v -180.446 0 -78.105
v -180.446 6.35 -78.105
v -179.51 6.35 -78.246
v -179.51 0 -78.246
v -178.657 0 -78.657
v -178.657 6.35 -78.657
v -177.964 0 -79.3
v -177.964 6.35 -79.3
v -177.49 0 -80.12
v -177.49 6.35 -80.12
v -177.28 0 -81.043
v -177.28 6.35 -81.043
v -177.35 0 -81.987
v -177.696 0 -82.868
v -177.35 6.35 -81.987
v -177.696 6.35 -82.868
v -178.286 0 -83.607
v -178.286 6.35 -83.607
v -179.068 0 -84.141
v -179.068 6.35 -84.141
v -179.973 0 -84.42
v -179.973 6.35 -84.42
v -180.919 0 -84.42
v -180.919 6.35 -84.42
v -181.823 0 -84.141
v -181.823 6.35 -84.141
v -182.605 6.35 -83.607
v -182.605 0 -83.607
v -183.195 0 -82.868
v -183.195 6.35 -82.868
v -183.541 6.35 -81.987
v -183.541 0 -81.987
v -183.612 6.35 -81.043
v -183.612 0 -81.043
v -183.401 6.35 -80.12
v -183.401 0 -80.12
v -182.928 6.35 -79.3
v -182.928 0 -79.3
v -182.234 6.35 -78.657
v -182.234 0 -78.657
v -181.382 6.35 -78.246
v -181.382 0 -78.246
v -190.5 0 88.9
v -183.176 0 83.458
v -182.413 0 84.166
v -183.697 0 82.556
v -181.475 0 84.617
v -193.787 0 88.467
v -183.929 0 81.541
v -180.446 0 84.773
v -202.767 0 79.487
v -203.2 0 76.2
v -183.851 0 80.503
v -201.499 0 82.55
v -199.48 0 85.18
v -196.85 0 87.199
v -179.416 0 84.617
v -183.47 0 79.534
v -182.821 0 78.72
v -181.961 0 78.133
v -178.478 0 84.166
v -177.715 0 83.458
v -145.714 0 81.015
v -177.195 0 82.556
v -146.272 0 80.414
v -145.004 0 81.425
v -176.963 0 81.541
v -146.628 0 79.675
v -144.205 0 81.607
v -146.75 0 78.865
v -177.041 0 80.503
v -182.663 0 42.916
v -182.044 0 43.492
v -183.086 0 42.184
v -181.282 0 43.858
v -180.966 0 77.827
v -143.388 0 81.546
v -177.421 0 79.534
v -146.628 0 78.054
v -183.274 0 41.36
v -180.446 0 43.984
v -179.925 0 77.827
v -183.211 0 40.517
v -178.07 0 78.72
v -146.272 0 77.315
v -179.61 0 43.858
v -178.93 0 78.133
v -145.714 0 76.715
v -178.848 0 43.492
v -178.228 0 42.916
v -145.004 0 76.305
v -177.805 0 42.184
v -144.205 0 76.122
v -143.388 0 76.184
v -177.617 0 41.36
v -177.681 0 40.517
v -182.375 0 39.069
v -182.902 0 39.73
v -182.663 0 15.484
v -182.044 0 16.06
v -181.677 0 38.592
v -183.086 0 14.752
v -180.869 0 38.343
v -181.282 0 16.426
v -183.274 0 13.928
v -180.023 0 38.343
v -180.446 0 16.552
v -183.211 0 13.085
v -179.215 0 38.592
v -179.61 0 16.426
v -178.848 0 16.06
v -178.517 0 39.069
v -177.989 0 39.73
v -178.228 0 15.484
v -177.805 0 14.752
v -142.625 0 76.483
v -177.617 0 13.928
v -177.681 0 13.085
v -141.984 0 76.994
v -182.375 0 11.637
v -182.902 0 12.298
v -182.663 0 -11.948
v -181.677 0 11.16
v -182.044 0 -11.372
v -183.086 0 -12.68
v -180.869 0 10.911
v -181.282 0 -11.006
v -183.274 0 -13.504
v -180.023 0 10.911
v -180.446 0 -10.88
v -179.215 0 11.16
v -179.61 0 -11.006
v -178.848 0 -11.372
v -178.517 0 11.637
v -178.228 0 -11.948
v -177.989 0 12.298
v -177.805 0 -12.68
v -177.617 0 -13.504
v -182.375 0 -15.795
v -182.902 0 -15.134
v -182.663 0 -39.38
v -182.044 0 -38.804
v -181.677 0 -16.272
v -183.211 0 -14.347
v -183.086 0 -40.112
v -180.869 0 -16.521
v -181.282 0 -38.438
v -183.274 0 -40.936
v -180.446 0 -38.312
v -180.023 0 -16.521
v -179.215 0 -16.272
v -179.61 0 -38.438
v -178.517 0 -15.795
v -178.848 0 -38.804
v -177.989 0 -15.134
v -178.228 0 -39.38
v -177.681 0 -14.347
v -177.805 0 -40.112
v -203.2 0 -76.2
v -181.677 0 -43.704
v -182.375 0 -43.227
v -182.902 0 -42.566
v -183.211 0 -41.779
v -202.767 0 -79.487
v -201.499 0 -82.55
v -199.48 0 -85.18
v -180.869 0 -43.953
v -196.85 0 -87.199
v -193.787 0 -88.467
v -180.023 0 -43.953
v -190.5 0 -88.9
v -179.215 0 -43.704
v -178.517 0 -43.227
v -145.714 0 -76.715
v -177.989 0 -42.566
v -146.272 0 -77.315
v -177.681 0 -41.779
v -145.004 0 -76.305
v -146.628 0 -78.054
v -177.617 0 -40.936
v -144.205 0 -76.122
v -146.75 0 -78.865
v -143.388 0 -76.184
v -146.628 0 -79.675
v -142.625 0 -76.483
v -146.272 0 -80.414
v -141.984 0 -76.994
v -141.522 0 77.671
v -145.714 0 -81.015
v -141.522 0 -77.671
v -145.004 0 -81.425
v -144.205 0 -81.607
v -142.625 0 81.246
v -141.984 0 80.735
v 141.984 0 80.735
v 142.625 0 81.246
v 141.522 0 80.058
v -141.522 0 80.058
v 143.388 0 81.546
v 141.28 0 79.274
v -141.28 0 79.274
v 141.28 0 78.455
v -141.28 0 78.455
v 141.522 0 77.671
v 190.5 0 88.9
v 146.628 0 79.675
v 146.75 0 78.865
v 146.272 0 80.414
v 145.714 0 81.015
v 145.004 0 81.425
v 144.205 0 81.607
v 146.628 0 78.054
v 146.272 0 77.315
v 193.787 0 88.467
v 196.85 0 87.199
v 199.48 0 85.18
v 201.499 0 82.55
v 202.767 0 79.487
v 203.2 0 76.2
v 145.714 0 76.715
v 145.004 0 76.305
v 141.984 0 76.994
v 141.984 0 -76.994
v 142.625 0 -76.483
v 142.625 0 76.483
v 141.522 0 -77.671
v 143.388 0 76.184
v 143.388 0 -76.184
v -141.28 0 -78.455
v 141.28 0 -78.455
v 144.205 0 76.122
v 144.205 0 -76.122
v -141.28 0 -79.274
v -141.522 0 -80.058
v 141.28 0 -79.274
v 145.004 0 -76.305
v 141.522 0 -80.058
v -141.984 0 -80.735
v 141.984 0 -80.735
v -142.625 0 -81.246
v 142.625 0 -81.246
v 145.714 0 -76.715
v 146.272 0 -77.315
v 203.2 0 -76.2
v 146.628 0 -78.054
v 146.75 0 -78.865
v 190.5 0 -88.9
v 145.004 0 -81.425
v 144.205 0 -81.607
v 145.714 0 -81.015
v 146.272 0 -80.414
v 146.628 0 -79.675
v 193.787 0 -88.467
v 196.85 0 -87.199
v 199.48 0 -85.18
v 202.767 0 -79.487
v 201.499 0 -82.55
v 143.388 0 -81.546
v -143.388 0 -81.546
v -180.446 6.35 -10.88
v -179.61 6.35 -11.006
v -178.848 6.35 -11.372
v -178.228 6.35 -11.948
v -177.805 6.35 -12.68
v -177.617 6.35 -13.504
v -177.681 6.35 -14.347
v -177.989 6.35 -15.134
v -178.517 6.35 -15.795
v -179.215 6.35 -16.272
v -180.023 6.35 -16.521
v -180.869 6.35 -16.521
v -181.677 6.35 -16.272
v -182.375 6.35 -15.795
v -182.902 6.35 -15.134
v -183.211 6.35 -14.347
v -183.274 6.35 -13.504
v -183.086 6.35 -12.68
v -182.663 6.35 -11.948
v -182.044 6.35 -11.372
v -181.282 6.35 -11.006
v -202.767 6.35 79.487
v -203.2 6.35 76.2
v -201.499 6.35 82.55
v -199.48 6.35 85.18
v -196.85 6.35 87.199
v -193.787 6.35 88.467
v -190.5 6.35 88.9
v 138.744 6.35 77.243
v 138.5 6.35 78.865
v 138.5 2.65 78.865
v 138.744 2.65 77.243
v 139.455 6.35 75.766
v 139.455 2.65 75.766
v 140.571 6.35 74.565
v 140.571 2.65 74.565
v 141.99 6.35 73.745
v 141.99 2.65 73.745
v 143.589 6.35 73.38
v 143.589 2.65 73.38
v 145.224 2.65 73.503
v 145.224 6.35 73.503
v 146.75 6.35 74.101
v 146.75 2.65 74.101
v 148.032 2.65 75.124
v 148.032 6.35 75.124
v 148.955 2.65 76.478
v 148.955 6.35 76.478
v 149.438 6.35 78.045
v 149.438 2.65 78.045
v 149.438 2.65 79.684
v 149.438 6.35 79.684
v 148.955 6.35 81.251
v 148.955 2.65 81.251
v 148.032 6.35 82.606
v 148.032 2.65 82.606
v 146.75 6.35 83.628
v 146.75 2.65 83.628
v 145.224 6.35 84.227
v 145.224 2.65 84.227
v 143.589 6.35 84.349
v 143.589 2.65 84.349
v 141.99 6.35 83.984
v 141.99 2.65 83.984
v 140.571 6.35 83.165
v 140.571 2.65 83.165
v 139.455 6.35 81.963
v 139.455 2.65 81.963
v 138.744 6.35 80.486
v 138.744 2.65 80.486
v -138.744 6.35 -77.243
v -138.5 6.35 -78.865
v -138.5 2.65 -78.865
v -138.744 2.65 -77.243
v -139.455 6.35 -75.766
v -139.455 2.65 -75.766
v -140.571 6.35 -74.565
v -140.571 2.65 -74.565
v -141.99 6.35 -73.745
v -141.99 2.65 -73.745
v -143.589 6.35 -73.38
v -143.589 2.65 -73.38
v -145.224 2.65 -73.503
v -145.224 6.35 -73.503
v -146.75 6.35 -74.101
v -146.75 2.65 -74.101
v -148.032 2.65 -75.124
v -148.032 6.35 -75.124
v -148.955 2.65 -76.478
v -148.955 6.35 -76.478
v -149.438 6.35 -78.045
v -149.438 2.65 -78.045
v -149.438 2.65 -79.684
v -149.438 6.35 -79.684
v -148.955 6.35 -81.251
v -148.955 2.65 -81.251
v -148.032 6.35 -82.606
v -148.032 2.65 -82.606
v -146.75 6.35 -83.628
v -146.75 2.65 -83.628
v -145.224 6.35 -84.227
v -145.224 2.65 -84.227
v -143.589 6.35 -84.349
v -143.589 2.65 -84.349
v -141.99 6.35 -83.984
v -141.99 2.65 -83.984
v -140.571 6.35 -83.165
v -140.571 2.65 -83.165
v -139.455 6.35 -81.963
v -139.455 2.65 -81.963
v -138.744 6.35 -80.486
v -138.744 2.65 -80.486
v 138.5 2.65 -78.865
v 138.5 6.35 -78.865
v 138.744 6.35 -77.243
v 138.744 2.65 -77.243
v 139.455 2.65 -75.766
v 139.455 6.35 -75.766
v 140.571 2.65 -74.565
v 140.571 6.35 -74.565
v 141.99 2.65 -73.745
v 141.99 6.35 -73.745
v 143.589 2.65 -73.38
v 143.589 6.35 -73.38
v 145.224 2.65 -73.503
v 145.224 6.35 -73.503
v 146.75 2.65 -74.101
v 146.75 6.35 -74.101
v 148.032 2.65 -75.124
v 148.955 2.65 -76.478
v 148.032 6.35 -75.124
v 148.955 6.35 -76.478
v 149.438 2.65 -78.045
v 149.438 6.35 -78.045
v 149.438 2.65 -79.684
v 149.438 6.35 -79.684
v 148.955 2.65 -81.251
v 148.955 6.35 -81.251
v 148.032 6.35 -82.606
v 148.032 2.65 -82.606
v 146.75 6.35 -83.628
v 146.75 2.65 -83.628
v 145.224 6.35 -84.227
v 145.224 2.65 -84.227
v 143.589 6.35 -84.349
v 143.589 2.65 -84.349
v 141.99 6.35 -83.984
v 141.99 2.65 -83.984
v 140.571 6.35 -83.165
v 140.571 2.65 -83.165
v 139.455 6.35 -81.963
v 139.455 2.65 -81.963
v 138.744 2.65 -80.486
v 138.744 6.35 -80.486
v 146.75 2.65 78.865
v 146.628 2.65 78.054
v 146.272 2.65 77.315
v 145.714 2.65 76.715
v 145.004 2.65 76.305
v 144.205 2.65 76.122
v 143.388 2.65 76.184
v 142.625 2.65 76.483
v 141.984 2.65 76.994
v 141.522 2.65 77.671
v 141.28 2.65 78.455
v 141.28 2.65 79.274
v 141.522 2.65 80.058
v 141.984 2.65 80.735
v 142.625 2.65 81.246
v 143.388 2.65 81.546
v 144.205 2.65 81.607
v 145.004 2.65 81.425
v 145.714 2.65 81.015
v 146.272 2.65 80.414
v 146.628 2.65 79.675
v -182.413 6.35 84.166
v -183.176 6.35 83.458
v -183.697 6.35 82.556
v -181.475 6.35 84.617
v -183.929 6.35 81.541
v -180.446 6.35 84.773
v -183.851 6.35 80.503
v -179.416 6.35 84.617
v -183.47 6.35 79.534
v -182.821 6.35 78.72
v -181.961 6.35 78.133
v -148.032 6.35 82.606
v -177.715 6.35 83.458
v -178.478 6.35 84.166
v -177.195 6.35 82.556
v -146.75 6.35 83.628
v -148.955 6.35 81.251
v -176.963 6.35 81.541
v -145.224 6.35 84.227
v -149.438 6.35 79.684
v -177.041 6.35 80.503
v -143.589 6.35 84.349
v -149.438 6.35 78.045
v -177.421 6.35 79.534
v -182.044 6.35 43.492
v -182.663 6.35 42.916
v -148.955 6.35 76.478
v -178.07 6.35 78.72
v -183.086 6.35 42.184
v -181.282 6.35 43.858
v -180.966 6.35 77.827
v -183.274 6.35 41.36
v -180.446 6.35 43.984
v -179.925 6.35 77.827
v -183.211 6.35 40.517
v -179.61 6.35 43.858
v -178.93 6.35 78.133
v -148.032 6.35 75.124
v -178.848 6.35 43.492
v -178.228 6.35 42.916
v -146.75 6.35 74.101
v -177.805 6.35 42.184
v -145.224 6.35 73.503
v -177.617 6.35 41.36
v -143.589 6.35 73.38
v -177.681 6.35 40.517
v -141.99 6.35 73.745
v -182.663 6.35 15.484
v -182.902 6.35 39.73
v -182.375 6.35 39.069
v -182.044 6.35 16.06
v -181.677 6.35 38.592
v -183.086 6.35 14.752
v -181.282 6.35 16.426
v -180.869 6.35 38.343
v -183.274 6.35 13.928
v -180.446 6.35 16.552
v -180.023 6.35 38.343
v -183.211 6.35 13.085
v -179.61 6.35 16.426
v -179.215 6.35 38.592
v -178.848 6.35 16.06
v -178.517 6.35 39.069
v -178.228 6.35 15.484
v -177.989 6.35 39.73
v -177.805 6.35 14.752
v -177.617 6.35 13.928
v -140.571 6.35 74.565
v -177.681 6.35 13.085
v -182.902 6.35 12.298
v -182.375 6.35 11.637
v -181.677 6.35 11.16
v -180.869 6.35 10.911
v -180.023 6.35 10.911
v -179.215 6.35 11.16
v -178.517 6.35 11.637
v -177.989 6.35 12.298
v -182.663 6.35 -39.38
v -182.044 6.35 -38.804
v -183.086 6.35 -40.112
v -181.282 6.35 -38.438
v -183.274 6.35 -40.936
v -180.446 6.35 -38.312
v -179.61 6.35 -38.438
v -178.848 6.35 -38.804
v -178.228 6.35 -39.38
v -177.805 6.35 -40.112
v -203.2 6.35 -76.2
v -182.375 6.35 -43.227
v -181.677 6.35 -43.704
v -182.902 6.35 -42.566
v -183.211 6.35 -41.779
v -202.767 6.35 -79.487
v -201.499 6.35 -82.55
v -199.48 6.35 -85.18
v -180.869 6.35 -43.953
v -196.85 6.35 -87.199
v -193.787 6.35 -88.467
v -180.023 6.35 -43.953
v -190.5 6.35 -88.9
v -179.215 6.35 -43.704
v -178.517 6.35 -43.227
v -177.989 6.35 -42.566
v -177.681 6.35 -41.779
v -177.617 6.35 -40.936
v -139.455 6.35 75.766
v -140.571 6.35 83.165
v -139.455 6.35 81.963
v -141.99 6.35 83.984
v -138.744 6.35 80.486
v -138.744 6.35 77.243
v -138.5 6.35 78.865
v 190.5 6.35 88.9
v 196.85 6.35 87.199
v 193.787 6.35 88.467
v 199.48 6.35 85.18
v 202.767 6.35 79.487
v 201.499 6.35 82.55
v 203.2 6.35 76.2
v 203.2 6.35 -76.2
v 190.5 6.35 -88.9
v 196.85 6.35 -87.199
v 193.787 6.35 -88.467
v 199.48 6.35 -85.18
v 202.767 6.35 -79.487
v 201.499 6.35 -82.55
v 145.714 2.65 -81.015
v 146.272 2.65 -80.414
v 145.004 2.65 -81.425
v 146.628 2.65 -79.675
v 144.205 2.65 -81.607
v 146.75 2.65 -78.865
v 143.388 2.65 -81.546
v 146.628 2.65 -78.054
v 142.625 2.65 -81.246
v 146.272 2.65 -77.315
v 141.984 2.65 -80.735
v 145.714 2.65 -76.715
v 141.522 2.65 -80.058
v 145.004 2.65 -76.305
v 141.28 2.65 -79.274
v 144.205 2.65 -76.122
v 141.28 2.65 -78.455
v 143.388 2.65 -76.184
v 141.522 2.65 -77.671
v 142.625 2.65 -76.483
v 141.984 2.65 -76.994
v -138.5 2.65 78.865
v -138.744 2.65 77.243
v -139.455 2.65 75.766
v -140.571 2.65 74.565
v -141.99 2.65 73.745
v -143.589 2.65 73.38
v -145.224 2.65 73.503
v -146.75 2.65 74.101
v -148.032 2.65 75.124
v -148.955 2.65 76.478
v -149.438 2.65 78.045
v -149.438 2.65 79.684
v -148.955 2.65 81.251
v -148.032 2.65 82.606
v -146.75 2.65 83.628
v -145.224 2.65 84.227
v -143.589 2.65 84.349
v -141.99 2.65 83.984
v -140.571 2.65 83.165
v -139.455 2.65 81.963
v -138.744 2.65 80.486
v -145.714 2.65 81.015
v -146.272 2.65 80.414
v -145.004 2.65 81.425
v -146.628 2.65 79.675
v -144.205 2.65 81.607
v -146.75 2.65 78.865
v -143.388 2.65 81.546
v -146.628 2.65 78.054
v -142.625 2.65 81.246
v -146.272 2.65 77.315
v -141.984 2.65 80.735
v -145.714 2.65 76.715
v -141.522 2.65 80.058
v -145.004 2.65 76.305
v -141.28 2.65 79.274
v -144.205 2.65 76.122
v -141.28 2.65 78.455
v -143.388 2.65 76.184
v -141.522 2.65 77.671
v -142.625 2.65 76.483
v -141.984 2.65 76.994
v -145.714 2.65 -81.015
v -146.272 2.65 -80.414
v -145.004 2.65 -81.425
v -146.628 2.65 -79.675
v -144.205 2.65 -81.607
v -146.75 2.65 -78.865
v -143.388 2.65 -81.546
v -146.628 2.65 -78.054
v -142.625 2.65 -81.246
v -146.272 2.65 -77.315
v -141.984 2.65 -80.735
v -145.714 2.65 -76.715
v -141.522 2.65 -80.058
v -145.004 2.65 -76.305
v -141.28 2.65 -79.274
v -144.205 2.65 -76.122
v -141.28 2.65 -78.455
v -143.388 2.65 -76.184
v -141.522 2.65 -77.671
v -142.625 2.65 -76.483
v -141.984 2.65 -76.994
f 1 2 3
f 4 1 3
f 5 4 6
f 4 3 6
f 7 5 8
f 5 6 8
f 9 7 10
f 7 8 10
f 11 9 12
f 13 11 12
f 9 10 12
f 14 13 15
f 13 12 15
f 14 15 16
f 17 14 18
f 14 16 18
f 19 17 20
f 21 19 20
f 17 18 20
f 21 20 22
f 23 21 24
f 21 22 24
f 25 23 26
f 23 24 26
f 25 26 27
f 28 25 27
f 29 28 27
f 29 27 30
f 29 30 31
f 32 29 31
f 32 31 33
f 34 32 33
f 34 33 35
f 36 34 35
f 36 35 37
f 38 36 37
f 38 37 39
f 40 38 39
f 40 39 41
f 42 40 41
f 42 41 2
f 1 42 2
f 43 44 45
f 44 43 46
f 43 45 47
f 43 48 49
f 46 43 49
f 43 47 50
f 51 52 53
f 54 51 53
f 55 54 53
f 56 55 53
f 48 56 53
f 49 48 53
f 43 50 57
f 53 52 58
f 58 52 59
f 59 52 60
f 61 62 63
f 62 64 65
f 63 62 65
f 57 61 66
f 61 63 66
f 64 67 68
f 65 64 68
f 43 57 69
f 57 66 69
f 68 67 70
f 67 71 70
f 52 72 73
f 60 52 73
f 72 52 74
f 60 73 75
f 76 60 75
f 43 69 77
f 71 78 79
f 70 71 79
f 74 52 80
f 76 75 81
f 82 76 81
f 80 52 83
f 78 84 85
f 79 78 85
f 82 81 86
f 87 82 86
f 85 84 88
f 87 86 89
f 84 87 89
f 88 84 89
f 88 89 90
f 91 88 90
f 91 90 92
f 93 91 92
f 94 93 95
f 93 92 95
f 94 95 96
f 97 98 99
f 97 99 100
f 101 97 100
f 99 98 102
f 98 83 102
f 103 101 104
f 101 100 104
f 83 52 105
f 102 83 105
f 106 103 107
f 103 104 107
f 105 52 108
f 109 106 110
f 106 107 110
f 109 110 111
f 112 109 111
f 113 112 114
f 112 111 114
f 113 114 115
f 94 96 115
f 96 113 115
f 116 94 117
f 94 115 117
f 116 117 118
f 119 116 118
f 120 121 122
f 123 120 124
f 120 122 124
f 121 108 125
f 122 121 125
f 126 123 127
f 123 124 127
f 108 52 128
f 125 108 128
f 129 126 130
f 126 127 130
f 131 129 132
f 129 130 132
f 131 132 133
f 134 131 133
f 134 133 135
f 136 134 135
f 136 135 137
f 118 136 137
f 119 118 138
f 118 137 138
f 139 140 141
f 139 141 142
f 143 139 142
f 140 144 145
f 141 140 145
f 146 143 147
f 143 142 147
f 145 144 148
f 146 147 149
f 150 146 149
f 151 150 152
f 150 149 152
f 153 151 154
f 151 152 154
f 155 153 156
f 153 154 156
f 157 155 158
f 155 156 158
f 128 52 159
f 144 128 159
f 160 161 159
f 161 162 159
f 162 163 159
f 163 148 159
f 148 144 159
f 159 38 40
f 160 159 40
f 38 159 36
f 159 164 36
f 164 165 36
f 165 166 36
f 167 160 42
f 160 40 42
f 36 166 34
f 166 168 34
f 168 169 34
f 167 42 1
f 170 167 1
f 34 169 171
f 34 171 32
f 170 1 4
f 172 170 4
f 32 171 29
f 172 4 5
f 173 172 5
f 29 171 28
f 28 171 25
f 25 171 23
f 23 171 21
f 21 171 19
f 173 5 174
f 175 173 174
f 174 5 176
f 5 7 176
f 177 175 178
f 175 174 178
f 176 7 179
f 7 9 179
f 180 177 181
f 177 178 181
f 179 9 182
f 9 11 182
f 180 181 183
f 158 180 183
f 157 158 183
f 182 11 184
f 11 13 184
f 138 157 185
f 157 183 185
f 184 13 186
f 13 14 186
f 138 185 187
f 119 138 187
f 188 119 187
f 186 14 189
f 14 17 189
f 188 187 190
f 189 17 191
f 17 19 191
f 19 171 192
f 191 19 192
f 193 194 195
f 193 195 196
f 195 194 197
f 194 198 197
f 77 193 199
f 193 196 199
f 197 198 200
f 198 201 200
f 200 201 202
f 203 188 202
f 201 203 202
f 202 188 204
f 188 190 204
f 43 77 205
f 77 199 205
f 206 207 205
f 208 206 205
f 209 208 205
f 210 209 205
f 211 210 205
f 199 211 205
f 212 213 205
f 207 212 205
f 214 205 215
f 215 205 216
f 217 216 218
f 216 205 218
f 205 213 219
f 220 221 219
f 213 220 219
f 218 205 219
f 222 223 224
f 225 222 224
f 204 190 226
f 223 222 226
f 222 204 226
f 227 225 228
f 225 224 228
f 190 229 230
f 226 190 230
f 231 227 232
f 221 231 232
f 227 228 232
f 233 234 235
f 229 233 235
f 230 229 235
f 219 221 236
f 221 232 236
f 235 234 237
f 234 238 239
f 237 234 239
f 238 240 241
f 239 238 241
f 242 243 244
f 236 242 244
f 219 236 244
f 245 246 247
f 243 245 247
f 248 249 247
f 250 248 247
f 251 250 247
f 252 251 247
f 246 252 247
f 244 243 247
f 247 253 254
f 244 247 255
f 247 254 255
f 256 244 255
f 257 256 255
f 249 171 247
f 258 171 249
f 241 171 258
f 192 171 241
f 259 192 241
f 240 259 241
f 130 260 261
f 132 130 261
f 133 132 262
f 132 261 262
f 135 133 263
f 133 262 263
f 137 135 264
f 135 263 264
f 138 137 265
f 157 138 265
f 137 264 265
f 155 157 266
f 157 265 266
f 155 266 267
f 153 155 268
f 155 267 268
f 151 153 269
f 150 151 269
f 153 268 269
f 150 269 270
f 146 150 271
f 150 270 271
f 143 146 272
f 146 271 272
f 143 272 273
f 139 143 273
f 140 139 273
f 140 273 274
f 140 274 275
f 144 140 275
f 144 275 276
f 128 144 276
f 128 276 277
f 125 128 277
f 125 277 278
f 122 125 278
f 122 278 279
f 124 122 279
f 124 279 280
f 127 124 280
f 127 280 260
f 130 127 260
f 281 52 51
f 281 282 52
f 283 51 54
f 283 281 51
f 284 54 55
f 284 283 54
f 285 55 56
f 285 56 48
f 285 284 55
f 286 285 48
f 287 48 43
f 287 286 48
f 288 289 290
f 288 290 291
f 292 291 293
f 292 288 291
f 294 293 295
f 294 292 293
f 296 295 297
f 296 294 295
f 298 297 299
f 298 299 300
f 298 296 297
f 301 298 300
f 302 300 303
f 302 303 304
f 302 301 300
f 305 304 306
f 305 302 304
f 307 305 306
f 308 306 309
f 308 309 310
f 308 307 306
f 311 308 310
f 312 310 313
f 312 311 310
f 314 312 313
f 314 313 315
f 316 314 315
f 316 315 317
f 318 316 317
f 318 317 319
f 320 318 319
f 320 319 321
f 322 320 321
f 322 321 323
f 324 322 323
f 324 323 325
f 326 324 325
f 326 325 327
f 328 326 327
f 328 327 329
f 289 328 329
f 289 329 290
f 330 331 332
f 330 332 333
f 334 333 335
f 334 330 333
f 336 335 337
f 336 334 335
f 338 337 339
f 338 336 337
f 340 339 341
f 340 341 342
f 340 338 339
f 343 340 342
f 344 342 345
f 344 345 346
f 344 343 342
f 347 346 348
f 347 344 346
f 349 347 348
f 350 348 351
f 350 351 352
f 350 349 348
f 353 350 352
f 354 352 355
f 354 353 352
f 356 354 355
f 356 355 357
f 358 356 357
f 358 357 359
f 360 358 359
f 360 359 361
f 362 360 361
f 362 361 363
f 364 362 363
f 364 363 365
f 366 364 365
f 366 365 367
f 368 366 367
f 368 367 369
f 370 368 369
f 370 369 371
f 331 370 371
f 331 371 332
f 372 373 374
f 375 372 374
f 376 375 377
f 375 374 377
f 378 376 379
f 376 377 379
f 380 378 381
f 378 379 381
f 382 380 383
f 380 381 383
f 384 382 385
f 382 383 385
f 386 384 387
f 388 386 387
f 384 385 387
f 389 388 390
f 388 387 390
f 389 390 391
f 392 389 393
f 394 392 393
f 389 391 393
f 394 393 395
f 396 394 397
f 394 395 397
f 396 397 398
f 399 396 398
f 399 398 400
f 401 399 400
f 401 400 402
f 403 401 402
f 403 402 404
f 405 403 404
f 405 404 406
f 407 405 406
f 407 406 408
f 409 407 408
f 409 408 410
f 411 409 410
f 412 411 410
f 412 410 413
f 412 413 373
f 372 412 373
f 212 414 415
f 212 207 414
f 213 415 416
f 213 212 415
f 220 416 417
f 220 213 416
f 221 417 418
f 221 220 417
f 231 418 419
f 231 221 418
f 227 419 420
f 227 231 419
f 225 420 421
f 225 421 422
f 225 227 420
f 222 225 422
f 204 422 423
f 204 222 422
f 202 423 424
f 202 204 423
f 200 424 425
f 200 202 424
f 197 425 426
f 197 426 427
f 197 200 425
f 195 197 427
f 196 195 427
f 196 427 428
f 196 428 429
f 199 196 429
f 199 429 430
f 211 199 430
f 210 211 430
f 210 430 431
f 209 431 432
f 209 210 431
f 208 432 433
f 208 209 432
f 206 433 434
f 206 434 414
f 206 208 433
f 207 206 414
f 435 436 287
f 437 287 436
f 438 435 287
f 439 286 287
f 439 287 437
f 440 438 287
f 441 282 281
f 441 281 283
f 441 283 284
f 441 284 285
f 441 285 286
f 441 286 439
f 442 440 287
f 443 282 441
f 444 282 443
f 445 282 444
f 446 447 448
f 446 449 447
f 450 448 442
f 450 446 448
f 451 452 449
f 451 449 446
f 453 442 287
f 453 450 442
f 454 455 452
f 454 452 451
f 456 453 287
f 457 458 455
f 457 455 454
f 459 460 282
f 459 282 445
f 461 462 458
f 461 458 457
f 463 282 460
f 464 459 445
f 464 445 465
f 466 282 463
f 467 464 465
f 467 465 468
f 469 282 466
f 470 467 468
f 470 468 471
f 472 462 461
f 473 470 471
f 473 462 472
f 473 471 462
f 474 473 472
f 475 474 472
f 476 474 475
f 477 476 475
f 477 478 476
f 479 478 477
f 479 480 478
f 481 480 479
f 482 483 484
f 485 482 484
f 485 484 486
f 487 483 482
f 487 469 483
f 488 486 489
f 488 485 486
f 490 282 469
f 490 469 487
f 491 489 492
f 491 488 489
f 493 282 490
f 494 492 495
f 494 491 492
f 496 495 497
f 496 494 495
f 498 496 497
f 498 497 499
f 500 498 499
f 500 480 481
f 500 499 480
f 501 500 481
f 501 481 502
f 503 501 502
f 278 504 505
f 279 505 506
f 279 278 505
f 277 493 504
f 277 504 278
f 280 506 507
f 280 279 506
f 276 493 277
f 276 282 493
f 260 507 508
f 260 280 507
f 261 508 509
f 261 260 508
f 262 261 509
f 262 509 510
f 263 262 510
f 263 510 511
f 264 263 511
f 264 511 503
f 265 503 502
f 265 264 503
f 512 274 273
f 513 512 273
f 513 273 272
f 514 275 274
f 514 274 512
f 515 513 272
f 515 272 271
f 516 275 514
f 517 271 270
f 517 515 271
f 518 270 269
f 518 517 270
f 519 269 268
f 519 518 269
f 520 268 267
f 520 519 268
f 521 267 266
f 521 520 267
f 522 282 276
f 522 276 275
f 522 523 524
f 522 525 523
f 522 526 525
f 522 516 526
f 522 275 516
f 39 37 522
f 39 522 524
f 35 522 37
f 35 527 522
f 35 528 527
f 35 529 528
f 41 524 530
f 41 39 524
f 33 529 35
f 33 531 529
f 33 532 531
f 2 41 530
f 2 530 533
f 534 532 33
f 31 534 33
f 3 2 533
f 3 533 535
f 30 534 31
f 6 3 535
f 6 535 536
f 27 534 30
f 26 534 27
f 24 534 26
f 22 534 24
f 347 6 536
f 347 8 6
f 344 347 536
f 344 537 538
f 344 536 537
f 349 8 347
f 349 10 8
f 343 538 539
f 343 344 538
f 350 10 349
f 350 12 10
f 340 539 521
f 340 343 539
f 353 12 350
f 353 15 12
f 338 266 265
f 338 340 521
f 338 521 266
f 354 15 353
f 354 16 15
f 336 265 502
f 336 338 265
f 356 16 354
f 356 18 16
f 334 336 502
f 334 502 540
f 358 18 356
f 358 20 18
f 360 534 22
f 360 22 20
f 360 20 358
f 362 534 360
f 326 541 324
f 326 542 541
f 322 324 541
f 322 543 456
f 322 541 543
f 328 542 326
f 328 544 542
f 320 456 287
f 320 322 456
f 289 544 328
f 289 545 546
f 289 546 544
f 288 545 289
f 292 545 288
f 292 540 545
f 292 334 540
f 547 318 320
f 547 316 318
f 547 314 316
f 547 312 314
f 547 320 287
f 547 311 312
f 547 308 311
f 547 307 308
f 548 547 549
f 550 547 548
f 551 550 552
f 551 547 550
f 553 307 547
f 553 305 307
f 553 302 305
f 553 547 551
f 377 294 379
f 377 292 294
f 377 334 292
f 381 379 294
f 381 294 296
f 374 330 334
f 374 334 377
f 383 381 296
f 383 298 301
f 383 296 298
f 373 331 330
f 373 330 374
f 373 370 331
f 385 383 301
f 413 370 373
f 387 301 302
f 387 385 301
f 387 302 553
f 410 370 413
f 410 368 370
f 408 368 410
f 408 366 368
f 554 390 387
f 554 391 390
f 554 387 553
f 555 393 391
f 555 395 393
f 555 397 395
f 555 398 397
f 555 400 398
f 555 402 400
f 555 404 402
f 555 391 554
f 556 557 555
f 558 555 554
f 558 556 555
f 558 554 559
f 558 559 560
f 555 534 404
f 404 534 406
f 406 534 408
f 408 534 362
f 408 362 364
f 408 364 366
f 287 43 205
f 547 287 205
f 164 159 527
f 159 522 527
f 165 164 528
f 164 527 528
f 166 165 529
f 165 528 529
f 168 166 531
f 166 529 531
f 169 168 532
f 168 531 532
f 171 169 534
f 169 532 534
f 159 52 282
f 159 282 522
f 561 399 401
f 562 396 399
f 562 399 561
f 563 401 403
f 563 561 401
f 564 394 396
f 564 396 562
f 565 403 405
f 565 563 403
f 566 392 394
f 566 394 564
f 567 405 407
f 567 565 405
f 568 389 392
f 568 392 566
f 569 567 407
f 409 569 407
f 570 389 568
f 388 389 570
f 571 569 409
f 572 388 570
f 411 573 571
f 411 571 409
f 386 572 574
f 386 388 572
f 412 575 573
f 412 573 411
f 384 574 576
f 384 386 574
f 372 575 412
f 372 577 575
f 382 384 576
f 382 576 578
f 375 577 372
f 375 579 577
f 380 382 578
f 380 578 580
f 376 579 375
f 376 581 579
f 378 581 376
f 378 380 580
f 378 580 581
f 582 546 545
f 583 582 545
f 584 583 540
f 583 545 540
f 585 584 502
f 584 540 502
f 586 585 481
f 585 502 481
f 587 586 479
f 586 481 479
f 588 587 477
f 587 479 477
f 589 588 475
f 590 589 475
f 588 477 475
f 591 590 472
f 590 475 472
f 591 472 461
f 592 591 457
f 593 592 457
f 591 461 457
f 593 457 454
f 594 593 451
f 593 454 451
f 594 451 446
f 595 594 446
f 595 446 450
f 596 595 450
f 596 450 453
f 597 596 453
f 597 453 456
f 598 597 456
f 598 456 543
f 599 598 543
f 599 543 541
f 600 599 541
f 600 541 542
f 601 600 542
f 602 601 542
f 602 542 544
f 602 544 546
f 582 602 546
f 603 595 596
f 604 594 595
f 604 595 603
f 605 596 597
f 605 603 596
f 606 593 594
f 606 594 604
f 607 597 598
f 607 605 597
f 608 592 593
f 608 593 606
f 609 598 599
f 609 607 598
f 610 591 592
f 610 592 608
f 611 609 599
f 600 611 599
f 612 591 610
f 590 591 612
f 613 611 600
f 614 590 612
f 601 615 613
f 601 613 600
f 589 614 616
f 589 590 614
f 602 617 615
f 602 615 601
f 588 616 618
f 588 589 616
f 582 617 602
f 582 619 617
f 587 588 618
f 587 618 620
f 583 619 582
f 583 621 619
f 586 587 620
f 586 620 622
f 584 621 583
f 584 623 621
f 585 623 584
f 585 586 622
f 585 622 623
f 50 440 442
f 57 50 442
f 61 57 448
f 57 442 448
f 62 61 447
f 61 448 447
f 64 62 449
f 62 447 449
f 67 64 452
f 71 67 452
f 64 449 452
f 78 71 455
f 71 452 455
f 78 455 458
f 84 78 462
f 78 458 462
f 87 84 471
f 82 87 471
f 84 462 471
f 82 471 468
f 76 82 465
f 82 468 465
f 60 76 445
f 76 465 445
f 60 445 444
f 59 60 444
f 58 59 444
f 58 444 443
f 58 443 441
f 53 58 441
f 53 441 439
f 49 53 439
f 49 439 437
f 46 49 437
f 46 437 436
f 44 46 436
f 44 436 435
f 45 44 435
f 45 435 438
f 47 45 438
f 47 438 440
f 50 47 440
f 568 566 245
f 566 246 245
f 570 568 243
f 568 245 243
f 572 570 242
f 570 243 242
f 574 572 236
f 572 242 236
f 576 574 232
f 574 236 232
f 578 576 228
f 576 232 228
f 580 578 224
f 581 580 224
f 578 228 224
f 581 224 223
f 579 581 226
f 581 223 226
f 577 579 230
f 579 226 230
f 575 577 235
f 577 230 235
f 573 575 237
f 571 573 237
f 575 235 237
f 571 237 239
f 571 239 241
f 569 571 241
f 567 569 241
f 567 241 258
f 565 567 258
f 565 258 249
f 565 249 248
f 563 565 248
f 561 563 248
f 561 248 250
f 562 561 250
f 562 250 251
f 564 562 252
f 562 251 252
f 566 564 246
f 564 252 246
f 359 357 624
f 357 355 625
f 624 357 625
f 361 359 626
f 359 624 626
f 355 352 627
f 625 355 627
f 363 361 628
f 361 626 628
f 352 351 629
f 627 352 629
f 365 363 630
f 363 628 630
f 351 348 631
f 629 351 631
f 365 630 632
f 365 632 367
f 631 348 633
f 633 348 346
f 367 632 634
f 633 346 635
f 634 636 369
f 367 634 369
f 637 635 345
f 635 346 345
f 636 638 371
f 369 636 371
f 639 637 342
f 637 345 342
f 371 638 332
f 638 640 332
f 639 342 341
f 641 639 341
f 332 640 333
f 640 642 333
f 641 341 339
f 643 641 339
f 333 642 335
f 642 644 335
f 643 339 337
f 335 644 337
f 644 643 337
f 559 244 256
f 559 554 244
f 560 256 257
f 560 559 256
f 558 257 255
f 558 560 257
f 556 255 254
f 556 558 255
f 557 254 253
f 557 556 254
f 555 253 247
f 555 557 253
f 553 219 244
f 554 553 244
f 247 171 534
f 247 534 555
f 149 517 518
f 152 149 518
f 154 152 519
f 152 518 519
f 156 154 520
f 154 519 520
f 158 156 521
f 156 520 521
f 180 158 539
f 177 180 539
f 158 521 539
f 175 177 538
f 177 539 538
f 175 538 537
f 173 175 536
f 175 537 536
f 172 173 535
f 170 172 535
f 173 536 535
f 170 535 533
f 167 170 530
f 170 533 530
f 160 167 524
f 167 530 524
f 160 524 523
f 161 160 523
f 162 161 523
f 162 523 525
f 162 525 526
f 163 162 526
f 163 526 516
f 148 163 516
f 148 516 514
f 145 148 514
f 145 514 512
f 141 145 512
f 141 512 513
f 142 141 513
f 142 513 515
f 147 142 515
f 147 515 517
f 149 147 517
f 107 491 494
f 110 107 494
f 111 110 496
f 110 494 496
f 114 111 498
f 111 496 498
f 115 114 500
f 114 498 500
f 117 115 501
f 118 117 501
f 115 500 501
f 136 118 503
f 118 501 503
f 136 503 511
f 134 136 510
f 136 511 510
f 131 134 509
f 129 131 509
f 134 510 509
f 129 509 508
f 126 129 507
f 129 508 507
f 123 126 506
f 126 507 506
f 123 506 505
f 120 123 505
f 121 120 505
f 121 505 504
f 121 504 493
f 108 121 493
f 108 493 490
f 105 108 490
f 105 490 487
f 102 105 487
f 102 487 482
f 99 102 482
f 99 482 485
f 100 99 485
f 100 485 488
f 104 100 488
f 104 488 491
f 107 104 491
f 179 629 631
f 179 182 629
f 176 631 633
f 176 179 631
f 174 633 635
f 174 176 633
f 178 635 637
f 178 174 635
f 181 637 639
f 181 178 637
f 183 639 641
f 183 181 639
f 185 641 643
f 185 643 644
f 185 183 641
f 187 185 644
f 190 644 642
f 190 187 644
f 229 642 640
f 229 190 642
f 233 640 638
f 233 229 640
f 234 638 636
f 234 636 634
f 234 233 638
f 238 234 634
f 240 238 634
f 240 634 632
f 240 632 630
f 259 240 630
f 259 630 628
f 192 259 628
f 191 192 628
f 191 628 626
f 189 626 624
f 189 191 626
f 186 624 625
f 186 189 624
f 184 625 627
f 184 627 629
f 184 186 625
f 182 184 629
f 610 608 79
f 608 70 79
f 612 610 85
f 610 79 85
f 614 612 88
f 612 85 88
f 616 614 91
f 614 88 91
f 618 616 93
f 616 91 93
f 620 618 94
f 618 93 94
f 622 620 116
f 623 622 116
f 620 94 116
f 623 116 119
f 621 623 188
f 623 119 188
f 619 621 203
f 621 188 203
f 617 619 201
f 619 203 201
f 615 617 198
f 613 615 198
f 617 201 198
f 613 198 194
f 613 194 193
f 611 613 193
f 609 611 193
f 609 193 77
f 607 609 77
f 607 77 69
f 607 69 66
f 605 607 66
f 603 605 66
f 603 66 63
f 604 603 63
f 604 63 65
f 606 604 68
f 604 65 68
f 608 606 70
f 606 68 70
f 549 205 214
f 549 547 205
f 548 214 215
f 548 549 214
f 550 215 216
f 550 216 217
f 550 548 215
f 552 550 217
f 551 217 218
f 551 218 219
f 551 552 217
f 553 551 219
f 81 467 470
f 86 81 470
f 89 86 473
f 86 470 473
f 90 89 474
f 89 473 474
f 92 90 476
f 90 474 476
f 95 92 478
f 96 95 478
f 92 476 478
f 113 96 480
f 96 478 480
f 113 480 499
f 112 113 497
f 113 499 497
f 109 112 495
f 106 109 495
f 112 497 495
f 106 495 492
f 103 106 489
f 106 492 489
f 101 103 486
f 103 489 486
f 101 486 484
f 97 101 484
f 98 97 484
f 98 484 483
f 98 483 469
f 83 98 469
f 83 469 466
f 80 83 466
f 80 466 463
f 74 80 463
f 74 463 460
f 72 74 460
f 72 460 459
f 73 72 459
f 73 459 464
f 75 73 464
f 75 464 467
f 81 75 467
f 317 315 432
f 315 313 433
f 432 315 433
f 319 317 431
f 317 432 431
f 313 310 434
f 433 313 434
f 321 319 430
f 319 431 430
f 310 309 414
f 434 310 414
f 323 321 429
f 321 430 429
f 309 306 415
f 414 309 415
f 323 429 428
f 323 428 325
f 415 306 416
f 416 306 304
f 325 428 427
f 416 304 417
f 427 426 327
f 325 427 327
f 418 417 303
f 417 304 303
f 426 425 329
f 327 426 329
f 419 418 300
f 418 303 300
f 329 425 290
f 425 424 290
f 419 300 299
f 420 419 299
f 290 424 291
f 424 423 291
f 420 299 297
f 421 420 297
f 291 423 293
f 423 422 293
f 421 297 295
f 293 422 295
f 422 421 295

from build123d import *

# Parameters (mm, degrees)
SKETCH1_W                                        = 406.4
SKETCH1_H                                        = 177.8
BOSS_EXTRUDE1_DEPTH                              = 6.35
FILLET1_R                                        = 12.7
CBORE_FOR_M5_PAN_HEAD_MACHINE_SCREW1_D           = 5.5
CBORE_FOR_M5_PAN_HEAD_MACHINE_SCREW1_CBORE_D     = 11
CBORE_FOR_M5_PAN_HEAD_MACHINE_SCREW1_CBORE_DEPTH = 3.7
MIRROR2_COPY_1_D                                 = 5.5
MIRROR2_COPY_1_CBORE_D                           = 11
MIRROR2_COPY_1_CBORE_DEPTH                       = 3.7
SKETCH4_R                                        = 3.175
SKETCH4_R_2                                      = 3.4925
CUT_EXTRUDE1_DEPTH                               = 222.886846163
SKETCH5_R                                        = 2.836407304
CUT_EXTRUDE2_DEPTH                               = 222.886846163


with BuildPart() as part:
    # Sketch1 → Boss-Extrude1 (new body)
    with BuildSketch(Plane(origin=(0, 0, 0), x_dir=(1, 0, 0), z_dir=(0, 1, 0))):
        Rectangle(SKETCH1_W, SKETCH1_H)
    extrude(amount=BOSS_EXTRUDE1_DEPTH)

    # Fillet1
    fillet1_edges = [part.edges().sort_by_distance(p)[0] for p in [
        (-203.2, 3.175, -88.9),
        (-203.2, 3.175, 88.9),
        (203.2, 3.175, 88.9),
        (203.2, 3.175, -88.9),
    ]]
    fillet(fillet1_edges, radius=FILLET1_R)

    # CBORE for M5 Pan Head Machine Screw1 (through all)
    with Locations(Plane(origin=(0, 6.35, 0), x_dir=(1, 0, 0), z_dir=(0, 1, 0))):
        with Locations((-143.999769965, -78.864619027)):
            cbore_for_m5_pan_head_machine_screw1 = CounterBoreHole(CBORE_FOR_M5_PAN_HEAD_MACHINE_SCREW1_D / 2, CBORE_FOR_M5_PAN_HEAD_MACHINE_SCREW1_CBORE_D / 2, CBORE_FOR_M5_PAN_HEAD_MACHINE_SCREW1_CBORE_DEPTH)

    # Mirror1: CBORE for M5 Pan Head Machine Screw1 across plane
    add(cbore_for_m5_pan_head_machine_screw1.mirror(Plane(origin=(0, 0, 0), x_dir=(0, 0, 1), z_dir=(1, 0, 0))), mode=Mode.SUBTRACT)

    # Mirror2: CBORE for M5 Pan Head Machine Screw1 across plane
    add(cbore_for_m5_pan_head_machine_screw1.mirror(Plane.XY), mode=Mode.SUBTRACT)

    # Mirror2 copy 1 (through all)
    with Locations(Plane(origin=(0, 6.35, 0), x_dir=(-1, 0, 0), z_dir=(0, 1, 0))):
        with Locations((-143.999769965, -78.864619027)):
            CounterBoreHole(MIRROR2_COPY_1_D / 2, MIRROR2_COPY_1_CBORE_D / 2, MIRROR2_COPY_1_CBORE_DEPTH)

    # Sketch4 → Cut-Extrude1 (cut, through all)
    with BuildSketch(Plane(origin=(0, 6.35, 0), x_dir=(1, 0, 0), z_dir=(0, 1, 0))):
        with Locations(Location((-180.445833333, 81.28, 0), (0, 0, 270))):
            Circle(SKETCH4_R)
        with Locations(Location((-180.445833333, -81.28, 0), (0, 0, 270))):
            Circle(SKETCH4_R_2)
    extrude(amount=-CUT_EXTRUDE1_DEPTH, mode=Mode.SUBTRACT)

    # Sketch5 → Cut-Extrude2 (cut, through all)
    with BuildSketch(Plane(origin=(0, 6.35, 0), x_dir=(1, 0, 0), z_dir=(0, 1, 0))):
        with Locations(Location((-180.445833333, 41.148, 0), (0, 0, 270))):
            Circle(SKETCH5_R)
        with Locations(Location((-180.445833333, 13.716, 0), (0, 0, 270))):
            Circle(SKETCH5_R)
        with Locations(Location((-180.445833333, -13.716, 0), (0, 0, 270))):
            Circle(SKETCH5_R)
        with Locations(Location((-180.445833333, -41.148, 0), (0, 0, 270))):
            Circle(SKETCH5_R)
    extrude(amount=-CUT_EXTRUDE2_DEPTH, mode=Mode.SUBTRACT)


solid = part.part
